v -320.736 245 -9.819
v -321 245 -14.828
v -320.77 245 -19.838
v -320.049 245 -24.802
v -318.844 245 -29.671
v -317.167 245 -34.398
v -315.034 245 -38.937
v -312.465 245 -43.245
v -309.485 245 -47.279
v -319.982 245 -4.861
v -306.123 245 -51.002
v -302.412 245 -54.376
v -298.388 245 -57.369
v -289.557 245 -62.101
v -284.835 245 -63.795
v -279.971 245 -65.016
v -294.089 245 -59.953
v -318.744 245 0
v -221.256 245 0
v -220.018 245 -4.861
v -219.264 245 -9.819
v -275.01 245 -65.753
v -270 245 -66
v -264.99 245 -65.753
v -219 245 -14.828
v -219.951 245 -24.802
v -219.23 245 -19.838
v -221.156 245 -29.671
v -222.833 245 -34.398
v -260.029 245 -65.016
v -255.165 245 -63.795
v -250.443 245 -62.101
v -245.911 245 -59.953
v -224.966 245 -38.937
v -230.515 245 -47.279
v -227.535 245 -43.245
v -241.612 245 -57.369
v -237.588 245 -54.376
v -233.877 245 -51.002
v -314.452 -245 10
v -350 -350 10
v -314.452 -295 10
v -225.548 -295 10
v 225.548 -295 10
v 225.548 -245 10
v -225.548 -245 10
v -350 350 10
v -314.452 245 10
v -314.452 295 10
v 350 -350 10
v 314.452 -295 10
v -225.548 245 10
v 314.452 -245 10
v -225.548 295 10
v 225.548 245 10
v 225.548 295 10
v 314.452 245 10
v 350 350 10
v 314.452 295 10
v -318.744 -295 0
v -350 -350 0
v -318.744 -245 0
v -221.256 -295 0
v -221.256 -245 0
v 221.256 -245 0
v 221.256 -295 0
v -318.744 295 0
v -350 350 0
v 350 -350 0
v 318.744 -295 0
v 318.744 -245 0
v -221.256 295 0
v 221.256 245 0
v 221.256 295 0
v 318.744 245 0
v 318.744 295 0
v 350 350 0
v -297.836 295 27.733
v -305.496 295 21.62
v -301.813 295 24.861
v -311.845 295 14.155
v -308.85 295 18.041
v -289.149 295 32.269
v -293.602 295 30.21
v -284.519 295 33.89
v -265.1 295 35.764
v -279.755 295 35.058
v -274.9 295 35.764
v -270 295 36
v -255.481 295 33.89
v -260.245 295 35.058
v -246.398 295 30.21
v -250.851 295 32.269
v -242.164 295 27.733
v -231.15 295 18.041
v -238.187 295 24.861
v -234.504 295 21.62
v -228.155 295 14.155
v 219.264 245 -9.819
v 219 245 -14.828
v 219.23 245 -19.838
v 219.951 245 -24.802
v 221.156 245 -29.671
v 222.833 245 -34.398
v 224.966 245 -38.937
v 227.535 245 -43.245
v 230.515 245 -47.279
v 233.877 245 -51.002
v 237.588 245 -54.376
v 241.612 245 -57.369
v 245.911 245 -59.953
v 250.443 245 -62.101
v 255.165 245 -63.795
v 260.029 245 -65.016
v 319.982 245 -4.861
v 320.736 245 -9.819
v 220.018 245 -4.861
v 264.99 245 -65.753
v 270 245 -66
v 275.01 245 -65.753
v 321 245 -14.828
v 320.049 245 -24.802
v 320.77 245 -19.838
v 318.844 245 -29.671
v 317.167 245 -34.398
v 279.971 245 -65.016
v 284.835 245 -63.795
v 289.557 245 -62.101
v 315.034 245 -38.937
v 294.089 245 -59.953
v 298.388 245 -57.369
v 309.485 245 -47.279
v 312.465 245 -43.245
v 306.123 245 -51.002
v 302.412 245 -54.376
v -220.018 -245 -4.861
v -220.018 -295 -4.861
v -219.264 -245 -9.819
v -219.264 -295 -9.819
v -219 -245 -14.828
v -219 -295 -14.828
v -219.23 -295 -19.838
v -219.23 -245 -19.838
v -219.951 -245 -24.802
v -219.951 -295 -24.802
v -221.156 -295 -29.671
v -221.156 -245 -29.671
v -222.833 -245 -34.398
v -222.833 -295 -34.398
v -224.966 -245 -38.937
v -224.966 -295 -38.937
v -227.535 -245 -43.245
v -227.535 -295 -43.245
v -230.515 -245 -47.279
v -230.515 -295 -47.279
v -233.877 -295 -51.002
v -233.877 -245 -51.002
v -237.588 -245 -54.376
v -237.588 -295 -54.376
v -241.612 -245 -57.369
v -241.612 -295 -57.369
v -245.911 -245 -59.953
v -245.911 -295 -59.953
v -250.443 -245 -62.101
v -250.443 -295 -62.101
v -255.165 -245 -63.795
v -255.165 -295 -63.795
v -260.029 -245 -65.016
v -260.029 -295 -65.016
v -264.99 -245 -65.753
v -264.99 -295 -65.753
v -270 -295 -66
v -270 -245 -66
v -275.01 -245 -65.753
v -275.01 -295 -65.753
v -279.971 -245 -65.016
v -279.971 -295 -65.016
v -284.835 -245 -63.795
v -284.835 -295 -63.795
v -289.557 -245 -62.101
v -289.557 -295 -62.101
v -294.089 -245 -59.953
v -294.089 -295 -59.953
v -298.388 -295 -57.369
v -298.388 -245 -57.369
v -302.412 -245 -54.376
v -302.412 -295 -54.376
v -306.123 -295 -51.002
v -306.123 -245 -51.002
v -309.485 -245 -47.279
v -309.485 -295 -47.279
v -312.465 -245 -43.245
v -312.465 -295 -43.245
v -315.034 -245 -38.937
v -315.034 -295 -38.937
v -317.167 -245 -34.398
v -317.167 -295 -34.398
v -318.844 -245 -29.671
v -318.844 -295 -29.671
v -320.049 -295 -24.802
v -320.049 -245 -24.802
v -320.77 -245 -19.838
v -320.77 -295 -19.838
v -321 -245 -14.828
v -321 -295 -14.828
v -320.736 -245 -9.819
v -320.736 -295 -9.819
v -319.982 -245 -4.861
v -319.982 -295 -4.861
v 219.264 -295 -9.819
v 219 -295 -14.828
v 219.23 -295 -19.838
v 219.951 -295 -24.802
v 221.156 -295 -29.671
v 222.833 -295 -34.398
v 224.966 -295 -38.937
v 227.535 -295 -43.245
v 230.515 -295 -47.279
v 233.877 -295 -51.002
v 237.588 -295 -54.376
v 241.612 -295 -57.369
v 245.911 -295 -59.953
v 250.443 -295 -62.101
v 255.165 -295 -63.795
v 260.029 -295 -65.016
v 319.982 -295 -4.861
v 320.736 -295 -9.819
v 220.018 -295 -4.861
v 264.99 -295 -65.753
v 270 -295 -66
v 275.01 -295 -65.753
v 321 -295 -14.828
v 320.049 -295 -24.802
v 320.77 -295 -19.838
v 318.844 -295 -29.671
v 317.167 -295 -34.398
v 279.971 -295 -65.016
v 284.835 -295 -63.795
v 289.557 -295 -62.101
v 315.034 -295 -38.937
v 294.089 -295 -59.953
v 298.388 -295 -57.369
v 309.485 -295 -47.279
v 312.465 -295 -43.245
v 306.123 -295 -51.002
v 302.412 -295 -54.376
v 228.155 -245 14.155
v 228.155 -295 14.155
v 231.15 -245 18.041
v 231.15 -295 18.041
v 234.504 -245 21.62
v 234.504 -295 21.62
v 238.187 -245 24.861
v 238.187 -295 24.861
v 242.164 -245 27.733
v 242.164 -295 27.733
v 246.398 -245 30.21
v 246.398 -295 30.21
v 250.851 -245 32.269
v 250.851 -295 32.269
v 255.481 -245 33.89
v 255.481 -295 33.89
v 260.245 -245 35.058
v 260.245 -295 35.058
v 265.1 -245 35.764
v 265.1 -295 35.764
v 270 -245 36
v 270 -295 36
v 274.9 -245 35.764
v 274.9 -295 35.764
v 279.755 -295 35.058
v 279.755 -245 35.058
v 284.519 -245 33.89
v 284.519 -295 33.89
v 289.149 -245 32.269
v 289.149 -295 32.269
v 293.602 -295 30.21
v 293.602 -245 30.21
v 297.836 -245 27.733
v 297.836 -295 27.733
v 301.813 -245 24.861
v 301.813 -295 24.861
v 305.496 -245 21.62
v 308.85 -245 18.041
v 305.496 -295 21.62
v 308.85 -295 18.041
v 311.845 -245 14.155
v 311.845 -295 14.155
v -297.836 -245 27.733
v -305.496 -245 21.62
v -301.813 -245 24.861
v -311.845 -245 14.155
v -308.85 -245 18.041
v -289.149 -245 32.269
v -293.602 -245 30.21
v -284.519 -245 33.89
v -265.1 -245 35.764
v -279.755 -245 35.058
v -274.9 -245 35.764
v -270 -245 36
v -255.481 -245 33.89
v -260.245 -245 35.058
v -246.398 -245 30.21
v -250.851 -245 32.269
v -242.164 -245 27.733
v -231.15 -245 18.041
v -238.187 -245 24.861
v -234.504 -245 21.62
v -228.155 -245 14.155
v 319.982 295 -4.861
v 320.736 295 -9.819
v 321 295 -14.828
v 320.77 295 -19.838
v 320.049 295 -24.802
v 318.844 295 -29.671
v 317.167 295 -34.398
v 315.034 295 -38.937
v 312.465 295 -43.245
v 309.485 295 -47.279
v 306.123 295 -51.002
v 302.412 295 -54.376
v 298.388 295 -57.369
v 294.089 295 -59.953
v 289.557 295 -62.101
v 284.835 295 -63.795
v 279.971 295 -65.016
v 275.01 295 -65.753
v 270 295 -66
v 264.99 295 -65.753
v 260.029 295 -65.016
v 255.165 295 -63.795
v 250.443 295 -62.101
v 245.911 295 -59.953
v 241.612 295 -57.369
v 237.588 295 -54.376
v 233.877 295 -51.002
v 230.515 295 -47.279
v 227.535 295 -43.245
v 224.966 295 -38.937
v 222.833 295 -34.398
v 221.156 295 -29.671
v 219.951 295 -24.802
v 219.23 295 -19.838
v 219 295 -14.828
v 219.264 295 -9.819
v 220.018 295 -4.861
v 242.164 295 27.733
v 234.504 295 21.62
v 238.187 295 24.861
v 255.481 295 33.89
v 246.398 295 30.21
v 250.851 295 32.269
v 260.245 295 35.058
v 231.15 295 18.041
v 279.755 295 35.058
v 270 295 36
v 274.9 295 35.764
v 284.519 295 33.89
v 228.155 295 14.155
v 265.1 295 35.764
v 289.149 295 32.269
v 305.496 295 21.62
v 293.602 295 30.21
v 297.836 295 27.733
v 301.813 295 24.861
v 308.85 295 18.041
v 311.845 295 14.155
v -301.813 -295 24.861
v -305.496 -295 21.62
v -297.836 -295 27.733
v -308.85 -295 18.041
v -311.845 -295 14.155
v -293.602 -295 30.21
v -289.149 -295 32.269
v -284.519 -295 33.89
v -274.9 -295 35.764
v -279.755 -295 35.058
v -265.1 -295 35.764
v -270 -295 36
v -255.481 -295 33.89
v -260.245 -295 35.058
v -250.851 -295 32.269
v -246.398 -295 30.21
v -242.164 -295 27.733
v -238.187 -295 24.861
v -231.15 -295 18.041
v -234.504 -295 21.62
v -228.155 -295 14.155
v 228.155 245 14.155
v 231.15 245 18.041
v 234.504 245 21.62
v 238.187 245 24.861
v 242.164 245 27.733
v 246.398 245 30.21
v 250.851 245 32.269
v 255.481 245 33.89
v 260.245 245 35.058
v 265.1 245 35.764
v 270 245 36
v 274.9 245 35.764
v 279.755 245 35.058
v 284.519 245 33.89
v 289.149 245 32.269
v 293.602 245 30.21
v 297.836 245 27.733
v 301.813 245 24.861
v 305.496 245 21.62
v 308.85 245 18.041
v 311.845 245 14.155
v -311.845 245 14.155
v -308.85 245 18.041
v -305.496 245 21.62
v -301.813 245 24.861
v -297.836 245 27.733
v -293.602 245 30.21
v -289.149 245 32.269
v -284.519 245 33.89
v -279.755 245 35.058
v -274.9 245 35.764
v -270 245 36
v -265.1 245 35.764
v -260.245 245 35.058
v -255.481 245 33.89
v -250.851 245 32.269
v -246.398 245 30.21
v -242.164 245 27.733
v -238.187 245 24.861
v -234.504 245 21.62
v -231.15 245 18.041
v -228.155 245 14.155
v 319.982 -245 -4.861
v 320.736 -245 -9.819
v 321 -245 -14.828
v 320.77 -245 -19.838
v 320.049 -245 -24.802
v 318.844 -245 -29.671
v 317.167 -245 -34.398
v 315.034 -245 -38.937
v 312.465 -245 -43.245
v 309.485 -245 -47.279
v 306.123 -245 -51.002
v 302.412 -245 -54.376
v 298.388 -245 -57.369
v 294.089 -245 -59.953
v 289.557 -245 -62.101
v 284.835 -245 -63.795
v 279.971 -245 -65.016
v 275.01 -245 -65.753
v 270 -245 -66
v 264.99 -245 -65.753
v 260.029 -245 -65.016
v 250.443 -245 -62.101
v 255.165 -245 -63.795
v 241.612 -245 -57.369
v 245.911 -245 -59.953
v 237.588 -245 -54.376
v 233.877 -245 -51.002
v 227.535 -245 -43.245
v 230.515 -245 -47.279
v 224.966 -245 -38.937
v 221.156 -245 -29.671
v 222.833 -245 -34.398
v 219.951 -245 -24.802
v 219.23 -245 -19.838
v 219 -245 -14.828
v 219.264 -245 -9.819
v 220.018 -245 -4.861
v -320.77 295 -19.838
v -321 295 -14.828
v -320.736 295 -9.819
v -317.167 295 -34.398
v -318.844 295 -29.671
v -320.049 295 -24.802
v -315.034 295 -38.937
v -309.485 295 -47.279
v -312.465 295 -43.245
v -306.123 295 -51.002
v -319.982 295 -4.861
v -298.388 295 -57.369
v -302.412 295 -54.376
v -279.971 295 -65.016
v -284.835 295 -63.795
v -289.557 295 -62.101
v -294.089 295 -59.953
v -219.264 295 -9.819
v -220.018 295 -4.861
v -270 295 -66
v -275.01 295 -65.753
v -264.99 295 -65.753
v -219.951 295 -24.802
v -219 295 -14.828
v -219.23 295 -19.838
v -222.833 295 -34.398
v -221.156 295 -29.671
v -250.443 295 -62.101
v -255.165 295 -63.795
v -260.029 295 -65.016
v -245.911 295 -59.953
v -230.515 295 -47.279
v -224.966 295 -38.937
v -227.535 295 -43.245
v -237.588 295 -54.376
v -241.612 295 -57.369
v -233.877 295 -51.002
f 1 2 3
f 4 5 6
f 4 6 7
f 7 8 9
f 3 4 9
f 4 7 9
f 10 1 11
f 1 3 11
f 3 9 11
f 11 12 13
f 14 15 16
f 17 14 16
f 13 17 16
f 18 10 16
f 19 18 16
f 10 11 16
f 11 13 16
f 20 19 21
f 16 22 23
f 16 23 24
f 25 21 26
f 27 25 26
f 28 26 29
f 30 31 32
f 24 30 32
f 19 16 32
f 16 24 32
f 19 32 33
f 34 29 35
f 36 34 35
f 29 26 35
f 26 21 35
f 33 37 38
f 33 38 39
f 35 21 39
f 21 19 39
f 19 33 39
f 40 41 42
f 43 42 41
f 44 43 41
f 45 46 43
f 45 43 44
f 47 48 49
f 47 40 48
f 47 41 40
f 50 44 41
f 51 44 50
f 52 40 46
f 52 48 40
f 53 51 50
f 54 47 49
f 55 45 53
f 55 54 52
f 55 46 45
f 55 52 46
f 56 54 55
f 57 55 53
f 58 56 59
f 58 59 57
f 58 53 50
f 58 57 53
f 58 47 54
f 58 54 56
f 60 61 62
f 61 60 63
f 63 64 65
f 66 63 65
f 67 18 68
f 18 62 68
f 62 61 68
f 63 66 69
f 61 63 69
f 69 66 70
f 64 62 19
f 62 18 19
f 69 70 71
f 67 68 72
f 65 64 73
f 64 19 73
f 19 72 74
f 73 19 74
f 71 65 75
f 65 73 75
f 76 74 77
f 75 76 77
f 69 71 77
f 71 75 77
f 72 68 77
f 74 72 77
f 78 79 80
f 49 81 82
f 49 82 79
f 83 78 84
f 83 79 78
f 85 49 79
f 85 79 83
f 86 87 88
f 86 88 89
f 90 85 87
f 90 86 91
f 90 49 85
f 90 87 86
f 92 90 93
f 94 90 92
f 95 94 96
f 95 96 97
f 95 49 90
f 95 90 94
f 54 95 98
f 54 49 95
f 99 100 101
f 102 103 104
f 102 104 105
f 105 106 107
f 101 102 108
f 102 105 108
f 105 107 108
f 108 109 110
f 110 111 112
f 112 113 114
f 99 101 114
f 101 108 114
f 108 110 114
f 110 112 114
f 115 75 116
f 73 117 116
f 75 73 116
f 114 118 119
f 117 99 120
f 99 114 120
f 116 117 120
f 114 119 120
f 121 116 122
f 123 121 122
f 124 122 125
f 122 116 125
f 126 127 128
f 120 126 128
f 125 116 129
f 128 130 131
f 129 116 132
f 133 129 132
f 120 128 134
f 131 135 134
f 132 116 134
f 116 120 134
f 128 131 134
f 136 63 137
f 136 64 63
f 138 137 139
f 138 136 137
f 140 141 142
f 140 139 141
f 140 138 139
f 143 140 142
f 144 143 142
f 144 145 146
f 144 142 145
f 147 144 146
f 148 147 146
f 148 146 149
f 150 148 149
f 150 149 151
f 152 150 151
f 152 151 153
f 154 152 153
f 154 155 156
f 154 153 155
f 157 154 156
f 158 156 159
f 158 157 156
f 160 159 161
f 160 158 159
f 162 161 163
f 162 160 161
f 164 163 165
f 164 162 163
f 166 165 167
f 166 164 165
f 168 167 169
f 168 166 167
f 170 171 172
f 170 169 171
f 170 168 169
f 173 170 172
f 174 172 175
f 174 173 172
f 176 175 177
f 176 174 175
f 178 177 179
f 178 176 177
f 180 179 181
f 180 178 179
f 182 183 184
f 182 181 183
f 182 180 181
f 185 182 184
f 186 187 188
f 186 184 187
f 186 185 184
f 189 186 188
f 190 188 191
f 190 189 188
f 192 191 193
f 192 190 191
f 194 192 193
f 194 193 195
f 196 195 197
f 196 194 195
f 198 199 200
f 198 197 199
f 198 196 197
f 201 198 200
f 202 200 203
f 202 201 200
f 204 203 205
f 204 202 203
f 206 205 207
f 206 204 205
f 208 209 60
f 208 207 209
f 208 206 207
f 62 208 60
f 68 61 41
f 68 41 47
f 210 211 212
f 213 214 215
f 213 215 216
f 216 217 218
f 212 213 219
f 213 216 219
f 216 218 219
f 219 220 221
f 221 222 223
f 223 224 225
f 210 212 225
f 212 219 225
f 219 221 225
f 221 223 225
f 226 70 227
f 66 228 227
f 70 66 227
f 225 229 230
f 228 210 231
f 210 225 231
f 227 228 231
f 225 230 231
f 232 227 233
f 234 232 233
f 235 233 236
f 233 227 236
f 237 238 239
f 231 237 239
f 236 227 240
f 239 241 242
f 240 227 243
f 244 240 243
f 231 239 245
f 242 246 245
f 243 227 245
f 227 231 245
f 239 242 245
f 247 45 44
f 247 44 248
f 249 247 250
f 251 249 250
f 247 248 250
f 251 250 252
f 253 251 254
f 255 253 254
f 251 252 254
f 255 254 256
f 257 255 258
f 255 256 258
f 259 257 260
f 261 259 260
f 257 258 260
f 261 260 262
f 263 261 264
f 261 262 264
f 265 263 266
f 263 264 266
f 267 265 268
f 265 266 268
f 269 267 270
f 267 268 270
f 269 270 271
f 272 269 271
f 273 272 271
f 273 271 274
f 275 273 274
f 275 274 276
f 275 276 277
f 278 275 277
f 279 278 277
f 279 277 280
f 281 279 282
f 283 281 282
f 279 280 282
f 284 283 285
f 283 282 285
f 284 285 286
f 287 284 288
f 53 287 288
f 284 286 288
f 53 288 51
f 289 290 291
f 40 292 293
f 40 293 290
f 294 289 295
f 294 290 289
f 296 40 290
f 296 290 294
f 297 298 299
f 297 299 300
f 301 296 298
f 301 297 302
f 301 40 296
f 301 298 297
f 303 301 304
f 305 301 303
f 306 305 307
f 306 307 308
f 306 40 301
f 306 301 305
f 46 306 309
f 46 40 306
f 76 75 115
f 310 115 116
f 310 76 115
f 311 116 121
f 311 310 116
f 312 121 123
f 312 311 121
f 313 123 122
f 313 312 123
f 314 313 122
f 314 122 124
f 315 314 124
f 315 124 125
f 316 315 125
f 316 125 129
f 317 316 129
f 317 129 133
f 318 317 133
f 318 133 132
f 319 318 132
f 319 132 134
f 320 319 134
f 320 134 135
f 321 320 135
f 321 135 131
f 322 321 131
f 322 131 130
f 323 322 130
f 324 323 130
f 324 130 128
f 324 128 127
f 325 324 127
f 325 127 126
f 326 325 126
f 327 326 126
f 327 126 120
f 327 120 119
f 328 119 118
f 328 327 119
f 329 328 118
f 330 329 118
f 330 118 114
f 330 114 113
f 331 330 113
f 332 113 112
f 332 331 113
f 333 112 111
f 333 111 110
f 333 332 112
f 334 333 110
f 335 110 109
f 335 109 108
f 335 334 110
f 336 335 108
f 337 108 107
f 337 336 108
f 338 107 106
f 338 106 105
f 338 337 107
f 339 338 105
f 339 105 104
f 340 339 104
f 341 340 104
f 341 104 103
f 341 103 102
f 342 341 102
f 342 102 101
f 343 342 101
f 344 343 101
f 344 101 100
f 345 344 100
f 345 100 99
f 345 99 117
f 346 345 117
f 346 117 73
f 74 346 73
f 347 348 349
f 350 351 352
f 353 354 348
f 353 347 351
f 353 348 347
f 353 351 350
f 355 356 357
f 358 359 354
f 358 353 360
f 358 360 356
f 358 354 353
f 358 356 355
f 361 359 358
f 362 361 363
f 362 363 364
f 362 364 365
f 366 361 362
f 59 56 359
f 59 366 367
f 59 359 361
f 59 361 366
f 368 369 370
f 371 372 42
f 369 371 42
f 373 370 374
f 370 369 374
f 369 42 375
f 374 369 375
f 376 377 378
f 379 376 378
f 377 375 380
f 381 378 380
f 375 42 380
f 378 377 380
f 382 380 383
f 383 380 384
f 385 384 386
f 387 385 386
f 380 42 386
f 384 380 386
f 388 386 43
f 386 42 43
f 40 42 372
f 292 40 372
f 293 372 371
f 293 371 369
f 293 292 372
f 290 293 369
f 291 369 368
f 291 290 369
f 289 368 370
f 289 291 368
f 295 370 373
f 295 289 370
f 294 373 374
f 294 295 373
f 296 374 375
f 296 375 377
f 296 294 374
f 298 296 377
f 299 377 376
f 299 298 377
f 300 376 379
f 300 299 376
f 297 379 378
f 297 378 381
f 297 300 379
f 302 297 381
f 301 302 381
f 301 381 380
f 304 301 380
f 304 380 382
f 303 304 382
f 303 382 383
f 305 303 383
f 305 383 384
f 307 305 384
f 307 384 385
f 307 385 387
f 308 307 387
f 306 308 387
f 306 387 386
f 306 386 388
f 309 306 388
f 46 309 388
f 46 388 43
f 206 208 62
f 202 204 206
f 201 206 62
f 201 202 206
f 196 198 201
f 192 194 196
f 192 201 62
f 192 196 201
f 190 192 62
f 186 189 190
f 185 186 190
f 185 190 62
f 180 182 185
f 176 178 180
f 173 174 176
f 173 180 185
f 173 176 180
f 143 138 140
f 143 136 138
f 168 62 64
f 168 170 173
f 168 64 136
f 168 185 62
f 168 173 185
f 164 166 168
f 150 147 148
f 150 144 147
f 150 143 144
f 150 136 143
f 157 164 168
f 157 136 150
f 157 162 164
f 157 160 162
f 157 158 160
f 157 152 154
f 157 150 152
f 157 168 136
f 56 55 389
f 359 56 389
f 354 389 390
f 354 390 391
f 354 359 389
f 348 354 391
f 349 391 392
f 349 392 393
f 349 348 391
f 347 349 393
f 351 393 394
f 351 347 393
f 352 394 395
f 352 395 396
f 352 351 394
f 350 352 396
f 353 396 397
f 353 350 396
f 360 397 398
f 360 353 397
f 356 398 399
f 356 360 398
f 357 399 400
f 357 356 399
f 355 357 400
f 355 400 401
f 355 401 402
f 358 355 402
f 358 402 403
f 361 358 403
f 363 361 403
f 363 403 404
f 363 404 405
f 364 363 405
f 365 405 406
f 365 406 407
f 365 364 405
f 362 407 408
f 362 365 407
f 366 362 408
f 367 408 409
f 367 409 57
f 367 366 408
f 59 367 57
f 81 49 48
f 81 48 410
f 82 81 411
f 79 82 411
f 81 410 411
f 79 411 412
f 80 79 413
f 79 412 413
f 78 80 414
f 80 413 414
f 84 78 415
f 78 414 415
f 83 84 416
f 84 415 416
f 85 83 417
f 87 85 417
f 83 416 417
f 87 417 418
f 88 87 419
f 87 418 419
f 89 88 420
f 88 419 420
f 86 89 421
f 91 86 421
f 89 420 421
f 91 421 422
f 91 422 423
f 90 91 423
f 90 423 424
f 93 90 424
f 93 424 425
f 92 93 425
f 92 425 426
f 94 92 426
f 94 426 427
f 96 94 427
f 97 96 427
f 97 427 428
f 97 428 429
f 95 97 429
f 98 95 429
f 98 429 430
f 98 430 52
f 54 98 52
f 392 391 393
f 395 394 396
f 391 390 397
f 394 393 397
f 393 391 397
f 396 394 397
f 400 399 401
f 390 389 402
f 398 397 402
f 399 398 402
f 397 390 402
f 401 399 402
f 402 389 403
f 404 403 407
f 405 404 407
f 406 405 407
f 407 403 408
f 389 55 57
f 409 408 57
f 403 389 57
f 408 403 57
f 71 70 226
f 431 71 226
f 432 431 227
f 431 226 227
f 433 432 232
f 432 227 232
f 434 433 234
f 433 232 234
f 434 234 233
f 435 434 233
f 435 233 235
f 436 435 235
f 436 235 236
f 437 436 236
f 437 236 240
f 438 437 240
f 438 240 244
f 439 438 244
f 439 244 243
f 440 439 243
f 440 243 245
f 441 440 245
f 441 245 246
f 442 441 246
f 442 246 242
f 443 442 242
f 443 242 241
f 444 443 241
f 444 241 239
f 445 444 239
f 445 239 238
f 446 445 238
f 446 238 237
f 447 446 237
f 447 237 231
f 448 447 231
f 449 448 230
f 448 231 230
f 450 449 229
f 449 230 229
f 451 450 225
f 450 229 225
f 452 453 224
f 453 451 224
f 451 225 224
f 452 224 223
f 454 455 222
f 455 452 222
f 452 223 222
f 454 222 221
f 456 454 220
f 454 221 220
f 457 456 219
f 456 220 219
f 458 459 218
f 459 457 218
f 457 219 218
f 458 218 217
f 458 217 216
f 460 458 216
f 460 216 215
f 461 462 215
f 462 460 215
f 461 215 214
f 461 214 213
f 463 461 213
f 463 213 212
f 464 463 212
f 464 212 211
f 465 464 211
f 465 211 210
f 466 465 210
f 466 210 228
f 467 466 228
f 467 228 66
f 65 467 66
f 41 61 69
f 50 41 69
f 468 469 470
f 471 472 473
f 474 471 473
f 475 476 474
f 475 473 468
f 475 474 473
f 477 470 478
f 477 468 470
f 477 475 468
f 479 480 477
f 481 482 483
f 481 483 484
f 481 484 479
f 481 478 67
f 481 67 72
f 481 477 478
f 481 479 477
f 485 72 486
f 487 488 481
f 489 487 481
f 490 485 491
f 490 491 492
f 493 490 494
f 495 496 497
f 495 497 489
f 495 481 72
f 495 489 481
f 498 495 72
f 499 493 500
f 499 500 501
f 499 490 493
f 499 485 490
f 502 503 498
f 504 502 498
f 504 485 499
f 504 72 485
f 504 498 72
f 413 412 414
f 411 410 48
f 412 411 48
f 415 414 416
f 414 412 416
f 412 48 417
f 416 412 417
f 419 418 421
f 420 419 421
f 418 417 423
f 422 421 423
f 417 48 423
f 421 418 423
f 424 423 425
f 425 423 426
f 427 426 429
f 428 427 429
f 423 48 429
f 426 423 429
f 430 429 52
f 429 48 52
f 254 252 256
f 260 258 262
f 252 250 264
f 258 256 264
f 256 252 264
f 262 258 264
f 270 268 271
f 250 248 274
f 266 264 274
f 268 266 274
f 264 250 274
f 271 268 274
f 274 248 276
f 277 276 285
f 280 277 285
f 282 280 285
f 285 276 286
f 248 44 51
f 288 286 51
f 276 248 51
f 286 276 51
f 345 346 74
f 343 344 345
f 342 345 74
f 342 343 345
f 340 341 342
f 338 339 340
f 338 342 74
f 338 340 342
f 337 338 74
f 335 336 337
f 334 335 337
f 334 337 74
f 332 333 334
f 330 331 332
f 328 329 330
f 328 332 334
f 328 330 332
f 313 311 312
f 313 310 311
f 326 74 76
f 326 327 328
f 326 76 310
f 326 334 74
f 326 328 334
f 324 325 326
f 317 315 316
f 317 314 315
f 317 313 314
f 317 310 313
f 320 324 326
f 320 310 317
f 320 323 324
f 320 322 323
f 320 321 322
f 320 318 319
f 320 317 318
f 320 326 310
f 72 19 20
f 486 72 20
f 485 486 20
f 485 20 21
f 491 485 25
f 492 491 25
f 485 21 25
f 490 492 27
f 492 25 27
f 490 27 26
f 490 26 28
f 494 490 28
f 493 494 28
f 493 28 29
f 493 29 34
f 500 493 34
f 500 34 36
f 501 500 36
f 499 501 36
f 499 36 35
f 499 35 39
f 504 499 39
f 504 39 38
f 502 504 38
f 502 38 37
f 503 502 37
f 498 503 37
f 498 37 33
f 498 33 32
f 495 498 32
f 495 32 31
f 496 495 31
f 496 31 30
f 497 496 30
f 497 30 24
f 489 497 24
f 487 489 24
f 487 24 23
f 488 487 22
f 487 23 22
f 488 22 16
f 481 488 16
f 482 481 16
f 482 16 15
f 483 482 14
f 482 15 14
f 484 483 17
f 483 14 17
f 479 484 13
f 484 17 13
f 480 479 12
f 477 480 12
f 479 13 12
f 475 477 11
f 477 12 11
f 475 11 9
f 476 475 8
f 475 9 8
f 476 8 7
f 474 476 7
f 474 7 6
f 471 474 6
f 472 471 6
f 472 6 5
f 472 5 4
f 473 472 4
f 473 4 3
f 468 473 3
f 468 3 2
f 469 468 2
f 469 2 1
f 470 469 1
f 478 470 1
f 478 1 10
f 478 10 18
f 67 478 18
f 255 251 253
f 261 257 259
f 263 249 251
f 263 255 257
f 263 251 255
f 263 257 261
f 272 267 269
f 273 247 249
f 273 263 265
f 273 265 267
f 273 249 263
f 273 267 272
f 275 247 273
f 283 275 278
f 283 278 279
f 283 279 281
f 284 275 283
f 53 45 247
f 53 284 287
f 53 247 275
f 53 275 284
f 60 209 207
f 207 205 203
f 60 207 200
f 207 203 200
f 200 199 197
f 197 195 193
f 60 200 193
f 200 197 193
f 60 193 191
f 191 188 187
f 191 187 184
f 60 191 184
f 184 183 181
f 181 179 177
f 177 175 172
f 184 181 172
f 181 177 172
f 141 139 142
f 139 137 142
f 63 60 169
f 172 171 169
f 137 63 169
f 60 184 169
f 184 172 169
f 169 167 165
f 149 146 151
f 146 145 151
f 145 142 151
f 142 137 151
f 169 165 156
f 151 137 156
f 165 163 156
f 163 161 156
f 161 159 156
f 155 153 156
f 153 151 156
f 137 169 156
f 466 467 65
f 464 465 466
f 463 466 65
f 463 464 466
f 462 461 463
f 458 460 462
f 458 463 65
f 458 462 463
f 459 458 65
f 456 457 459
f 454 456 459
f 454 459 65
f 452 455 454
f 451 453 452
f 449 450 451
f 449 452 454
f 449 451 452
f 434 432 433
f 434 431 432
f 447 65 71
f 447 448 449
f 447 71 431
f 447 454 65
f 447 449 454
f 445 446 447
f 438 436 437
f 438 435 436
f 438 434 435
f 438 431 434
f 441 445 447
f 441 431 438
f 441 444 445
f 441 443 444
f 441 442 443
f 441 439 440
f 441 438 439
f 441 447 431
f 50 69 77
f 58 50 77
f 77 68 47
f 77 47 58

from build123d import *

# Parameters (mm, degrees)
SKETCH_1_W      = 700
SKETCH_1_H      = 700
EXTRUDE_1_DEPTH = 10
SKETCH_2_R      = 51
EXTRUDE_2_DEPTH = 25


with BuildPart() as part:
    # 草图1 → 凸台-拉伸1 (new body)
    with BuildSketch(Plane.XY):
        Rectangle(SKETCH_1_W, SKETCH_1_H)
    extrude(amount=EXTRUDE_1_DEPTH)

    # 草图2 → 凸台-拉伸2 (add, symmetric)
    with BuildSketch(Plane(origin=(0, 270, 0), x_dir=(1, 0, 0), z_dir=(0, 1, 0))):
        with Locations((-270, 15)):
            Circle(SKETCH_2_R)
        with Locations((270, 15)):
            Circle(SKETCH_2_R)
    extrude_2 = extrude(amount=EXTRUDE_2_DEPTH, both=True)

    # 镜向1: 凸台-拉伸2 across plane
    add(extrude_2.mirror(Plane.ZX))


solid = part.part
